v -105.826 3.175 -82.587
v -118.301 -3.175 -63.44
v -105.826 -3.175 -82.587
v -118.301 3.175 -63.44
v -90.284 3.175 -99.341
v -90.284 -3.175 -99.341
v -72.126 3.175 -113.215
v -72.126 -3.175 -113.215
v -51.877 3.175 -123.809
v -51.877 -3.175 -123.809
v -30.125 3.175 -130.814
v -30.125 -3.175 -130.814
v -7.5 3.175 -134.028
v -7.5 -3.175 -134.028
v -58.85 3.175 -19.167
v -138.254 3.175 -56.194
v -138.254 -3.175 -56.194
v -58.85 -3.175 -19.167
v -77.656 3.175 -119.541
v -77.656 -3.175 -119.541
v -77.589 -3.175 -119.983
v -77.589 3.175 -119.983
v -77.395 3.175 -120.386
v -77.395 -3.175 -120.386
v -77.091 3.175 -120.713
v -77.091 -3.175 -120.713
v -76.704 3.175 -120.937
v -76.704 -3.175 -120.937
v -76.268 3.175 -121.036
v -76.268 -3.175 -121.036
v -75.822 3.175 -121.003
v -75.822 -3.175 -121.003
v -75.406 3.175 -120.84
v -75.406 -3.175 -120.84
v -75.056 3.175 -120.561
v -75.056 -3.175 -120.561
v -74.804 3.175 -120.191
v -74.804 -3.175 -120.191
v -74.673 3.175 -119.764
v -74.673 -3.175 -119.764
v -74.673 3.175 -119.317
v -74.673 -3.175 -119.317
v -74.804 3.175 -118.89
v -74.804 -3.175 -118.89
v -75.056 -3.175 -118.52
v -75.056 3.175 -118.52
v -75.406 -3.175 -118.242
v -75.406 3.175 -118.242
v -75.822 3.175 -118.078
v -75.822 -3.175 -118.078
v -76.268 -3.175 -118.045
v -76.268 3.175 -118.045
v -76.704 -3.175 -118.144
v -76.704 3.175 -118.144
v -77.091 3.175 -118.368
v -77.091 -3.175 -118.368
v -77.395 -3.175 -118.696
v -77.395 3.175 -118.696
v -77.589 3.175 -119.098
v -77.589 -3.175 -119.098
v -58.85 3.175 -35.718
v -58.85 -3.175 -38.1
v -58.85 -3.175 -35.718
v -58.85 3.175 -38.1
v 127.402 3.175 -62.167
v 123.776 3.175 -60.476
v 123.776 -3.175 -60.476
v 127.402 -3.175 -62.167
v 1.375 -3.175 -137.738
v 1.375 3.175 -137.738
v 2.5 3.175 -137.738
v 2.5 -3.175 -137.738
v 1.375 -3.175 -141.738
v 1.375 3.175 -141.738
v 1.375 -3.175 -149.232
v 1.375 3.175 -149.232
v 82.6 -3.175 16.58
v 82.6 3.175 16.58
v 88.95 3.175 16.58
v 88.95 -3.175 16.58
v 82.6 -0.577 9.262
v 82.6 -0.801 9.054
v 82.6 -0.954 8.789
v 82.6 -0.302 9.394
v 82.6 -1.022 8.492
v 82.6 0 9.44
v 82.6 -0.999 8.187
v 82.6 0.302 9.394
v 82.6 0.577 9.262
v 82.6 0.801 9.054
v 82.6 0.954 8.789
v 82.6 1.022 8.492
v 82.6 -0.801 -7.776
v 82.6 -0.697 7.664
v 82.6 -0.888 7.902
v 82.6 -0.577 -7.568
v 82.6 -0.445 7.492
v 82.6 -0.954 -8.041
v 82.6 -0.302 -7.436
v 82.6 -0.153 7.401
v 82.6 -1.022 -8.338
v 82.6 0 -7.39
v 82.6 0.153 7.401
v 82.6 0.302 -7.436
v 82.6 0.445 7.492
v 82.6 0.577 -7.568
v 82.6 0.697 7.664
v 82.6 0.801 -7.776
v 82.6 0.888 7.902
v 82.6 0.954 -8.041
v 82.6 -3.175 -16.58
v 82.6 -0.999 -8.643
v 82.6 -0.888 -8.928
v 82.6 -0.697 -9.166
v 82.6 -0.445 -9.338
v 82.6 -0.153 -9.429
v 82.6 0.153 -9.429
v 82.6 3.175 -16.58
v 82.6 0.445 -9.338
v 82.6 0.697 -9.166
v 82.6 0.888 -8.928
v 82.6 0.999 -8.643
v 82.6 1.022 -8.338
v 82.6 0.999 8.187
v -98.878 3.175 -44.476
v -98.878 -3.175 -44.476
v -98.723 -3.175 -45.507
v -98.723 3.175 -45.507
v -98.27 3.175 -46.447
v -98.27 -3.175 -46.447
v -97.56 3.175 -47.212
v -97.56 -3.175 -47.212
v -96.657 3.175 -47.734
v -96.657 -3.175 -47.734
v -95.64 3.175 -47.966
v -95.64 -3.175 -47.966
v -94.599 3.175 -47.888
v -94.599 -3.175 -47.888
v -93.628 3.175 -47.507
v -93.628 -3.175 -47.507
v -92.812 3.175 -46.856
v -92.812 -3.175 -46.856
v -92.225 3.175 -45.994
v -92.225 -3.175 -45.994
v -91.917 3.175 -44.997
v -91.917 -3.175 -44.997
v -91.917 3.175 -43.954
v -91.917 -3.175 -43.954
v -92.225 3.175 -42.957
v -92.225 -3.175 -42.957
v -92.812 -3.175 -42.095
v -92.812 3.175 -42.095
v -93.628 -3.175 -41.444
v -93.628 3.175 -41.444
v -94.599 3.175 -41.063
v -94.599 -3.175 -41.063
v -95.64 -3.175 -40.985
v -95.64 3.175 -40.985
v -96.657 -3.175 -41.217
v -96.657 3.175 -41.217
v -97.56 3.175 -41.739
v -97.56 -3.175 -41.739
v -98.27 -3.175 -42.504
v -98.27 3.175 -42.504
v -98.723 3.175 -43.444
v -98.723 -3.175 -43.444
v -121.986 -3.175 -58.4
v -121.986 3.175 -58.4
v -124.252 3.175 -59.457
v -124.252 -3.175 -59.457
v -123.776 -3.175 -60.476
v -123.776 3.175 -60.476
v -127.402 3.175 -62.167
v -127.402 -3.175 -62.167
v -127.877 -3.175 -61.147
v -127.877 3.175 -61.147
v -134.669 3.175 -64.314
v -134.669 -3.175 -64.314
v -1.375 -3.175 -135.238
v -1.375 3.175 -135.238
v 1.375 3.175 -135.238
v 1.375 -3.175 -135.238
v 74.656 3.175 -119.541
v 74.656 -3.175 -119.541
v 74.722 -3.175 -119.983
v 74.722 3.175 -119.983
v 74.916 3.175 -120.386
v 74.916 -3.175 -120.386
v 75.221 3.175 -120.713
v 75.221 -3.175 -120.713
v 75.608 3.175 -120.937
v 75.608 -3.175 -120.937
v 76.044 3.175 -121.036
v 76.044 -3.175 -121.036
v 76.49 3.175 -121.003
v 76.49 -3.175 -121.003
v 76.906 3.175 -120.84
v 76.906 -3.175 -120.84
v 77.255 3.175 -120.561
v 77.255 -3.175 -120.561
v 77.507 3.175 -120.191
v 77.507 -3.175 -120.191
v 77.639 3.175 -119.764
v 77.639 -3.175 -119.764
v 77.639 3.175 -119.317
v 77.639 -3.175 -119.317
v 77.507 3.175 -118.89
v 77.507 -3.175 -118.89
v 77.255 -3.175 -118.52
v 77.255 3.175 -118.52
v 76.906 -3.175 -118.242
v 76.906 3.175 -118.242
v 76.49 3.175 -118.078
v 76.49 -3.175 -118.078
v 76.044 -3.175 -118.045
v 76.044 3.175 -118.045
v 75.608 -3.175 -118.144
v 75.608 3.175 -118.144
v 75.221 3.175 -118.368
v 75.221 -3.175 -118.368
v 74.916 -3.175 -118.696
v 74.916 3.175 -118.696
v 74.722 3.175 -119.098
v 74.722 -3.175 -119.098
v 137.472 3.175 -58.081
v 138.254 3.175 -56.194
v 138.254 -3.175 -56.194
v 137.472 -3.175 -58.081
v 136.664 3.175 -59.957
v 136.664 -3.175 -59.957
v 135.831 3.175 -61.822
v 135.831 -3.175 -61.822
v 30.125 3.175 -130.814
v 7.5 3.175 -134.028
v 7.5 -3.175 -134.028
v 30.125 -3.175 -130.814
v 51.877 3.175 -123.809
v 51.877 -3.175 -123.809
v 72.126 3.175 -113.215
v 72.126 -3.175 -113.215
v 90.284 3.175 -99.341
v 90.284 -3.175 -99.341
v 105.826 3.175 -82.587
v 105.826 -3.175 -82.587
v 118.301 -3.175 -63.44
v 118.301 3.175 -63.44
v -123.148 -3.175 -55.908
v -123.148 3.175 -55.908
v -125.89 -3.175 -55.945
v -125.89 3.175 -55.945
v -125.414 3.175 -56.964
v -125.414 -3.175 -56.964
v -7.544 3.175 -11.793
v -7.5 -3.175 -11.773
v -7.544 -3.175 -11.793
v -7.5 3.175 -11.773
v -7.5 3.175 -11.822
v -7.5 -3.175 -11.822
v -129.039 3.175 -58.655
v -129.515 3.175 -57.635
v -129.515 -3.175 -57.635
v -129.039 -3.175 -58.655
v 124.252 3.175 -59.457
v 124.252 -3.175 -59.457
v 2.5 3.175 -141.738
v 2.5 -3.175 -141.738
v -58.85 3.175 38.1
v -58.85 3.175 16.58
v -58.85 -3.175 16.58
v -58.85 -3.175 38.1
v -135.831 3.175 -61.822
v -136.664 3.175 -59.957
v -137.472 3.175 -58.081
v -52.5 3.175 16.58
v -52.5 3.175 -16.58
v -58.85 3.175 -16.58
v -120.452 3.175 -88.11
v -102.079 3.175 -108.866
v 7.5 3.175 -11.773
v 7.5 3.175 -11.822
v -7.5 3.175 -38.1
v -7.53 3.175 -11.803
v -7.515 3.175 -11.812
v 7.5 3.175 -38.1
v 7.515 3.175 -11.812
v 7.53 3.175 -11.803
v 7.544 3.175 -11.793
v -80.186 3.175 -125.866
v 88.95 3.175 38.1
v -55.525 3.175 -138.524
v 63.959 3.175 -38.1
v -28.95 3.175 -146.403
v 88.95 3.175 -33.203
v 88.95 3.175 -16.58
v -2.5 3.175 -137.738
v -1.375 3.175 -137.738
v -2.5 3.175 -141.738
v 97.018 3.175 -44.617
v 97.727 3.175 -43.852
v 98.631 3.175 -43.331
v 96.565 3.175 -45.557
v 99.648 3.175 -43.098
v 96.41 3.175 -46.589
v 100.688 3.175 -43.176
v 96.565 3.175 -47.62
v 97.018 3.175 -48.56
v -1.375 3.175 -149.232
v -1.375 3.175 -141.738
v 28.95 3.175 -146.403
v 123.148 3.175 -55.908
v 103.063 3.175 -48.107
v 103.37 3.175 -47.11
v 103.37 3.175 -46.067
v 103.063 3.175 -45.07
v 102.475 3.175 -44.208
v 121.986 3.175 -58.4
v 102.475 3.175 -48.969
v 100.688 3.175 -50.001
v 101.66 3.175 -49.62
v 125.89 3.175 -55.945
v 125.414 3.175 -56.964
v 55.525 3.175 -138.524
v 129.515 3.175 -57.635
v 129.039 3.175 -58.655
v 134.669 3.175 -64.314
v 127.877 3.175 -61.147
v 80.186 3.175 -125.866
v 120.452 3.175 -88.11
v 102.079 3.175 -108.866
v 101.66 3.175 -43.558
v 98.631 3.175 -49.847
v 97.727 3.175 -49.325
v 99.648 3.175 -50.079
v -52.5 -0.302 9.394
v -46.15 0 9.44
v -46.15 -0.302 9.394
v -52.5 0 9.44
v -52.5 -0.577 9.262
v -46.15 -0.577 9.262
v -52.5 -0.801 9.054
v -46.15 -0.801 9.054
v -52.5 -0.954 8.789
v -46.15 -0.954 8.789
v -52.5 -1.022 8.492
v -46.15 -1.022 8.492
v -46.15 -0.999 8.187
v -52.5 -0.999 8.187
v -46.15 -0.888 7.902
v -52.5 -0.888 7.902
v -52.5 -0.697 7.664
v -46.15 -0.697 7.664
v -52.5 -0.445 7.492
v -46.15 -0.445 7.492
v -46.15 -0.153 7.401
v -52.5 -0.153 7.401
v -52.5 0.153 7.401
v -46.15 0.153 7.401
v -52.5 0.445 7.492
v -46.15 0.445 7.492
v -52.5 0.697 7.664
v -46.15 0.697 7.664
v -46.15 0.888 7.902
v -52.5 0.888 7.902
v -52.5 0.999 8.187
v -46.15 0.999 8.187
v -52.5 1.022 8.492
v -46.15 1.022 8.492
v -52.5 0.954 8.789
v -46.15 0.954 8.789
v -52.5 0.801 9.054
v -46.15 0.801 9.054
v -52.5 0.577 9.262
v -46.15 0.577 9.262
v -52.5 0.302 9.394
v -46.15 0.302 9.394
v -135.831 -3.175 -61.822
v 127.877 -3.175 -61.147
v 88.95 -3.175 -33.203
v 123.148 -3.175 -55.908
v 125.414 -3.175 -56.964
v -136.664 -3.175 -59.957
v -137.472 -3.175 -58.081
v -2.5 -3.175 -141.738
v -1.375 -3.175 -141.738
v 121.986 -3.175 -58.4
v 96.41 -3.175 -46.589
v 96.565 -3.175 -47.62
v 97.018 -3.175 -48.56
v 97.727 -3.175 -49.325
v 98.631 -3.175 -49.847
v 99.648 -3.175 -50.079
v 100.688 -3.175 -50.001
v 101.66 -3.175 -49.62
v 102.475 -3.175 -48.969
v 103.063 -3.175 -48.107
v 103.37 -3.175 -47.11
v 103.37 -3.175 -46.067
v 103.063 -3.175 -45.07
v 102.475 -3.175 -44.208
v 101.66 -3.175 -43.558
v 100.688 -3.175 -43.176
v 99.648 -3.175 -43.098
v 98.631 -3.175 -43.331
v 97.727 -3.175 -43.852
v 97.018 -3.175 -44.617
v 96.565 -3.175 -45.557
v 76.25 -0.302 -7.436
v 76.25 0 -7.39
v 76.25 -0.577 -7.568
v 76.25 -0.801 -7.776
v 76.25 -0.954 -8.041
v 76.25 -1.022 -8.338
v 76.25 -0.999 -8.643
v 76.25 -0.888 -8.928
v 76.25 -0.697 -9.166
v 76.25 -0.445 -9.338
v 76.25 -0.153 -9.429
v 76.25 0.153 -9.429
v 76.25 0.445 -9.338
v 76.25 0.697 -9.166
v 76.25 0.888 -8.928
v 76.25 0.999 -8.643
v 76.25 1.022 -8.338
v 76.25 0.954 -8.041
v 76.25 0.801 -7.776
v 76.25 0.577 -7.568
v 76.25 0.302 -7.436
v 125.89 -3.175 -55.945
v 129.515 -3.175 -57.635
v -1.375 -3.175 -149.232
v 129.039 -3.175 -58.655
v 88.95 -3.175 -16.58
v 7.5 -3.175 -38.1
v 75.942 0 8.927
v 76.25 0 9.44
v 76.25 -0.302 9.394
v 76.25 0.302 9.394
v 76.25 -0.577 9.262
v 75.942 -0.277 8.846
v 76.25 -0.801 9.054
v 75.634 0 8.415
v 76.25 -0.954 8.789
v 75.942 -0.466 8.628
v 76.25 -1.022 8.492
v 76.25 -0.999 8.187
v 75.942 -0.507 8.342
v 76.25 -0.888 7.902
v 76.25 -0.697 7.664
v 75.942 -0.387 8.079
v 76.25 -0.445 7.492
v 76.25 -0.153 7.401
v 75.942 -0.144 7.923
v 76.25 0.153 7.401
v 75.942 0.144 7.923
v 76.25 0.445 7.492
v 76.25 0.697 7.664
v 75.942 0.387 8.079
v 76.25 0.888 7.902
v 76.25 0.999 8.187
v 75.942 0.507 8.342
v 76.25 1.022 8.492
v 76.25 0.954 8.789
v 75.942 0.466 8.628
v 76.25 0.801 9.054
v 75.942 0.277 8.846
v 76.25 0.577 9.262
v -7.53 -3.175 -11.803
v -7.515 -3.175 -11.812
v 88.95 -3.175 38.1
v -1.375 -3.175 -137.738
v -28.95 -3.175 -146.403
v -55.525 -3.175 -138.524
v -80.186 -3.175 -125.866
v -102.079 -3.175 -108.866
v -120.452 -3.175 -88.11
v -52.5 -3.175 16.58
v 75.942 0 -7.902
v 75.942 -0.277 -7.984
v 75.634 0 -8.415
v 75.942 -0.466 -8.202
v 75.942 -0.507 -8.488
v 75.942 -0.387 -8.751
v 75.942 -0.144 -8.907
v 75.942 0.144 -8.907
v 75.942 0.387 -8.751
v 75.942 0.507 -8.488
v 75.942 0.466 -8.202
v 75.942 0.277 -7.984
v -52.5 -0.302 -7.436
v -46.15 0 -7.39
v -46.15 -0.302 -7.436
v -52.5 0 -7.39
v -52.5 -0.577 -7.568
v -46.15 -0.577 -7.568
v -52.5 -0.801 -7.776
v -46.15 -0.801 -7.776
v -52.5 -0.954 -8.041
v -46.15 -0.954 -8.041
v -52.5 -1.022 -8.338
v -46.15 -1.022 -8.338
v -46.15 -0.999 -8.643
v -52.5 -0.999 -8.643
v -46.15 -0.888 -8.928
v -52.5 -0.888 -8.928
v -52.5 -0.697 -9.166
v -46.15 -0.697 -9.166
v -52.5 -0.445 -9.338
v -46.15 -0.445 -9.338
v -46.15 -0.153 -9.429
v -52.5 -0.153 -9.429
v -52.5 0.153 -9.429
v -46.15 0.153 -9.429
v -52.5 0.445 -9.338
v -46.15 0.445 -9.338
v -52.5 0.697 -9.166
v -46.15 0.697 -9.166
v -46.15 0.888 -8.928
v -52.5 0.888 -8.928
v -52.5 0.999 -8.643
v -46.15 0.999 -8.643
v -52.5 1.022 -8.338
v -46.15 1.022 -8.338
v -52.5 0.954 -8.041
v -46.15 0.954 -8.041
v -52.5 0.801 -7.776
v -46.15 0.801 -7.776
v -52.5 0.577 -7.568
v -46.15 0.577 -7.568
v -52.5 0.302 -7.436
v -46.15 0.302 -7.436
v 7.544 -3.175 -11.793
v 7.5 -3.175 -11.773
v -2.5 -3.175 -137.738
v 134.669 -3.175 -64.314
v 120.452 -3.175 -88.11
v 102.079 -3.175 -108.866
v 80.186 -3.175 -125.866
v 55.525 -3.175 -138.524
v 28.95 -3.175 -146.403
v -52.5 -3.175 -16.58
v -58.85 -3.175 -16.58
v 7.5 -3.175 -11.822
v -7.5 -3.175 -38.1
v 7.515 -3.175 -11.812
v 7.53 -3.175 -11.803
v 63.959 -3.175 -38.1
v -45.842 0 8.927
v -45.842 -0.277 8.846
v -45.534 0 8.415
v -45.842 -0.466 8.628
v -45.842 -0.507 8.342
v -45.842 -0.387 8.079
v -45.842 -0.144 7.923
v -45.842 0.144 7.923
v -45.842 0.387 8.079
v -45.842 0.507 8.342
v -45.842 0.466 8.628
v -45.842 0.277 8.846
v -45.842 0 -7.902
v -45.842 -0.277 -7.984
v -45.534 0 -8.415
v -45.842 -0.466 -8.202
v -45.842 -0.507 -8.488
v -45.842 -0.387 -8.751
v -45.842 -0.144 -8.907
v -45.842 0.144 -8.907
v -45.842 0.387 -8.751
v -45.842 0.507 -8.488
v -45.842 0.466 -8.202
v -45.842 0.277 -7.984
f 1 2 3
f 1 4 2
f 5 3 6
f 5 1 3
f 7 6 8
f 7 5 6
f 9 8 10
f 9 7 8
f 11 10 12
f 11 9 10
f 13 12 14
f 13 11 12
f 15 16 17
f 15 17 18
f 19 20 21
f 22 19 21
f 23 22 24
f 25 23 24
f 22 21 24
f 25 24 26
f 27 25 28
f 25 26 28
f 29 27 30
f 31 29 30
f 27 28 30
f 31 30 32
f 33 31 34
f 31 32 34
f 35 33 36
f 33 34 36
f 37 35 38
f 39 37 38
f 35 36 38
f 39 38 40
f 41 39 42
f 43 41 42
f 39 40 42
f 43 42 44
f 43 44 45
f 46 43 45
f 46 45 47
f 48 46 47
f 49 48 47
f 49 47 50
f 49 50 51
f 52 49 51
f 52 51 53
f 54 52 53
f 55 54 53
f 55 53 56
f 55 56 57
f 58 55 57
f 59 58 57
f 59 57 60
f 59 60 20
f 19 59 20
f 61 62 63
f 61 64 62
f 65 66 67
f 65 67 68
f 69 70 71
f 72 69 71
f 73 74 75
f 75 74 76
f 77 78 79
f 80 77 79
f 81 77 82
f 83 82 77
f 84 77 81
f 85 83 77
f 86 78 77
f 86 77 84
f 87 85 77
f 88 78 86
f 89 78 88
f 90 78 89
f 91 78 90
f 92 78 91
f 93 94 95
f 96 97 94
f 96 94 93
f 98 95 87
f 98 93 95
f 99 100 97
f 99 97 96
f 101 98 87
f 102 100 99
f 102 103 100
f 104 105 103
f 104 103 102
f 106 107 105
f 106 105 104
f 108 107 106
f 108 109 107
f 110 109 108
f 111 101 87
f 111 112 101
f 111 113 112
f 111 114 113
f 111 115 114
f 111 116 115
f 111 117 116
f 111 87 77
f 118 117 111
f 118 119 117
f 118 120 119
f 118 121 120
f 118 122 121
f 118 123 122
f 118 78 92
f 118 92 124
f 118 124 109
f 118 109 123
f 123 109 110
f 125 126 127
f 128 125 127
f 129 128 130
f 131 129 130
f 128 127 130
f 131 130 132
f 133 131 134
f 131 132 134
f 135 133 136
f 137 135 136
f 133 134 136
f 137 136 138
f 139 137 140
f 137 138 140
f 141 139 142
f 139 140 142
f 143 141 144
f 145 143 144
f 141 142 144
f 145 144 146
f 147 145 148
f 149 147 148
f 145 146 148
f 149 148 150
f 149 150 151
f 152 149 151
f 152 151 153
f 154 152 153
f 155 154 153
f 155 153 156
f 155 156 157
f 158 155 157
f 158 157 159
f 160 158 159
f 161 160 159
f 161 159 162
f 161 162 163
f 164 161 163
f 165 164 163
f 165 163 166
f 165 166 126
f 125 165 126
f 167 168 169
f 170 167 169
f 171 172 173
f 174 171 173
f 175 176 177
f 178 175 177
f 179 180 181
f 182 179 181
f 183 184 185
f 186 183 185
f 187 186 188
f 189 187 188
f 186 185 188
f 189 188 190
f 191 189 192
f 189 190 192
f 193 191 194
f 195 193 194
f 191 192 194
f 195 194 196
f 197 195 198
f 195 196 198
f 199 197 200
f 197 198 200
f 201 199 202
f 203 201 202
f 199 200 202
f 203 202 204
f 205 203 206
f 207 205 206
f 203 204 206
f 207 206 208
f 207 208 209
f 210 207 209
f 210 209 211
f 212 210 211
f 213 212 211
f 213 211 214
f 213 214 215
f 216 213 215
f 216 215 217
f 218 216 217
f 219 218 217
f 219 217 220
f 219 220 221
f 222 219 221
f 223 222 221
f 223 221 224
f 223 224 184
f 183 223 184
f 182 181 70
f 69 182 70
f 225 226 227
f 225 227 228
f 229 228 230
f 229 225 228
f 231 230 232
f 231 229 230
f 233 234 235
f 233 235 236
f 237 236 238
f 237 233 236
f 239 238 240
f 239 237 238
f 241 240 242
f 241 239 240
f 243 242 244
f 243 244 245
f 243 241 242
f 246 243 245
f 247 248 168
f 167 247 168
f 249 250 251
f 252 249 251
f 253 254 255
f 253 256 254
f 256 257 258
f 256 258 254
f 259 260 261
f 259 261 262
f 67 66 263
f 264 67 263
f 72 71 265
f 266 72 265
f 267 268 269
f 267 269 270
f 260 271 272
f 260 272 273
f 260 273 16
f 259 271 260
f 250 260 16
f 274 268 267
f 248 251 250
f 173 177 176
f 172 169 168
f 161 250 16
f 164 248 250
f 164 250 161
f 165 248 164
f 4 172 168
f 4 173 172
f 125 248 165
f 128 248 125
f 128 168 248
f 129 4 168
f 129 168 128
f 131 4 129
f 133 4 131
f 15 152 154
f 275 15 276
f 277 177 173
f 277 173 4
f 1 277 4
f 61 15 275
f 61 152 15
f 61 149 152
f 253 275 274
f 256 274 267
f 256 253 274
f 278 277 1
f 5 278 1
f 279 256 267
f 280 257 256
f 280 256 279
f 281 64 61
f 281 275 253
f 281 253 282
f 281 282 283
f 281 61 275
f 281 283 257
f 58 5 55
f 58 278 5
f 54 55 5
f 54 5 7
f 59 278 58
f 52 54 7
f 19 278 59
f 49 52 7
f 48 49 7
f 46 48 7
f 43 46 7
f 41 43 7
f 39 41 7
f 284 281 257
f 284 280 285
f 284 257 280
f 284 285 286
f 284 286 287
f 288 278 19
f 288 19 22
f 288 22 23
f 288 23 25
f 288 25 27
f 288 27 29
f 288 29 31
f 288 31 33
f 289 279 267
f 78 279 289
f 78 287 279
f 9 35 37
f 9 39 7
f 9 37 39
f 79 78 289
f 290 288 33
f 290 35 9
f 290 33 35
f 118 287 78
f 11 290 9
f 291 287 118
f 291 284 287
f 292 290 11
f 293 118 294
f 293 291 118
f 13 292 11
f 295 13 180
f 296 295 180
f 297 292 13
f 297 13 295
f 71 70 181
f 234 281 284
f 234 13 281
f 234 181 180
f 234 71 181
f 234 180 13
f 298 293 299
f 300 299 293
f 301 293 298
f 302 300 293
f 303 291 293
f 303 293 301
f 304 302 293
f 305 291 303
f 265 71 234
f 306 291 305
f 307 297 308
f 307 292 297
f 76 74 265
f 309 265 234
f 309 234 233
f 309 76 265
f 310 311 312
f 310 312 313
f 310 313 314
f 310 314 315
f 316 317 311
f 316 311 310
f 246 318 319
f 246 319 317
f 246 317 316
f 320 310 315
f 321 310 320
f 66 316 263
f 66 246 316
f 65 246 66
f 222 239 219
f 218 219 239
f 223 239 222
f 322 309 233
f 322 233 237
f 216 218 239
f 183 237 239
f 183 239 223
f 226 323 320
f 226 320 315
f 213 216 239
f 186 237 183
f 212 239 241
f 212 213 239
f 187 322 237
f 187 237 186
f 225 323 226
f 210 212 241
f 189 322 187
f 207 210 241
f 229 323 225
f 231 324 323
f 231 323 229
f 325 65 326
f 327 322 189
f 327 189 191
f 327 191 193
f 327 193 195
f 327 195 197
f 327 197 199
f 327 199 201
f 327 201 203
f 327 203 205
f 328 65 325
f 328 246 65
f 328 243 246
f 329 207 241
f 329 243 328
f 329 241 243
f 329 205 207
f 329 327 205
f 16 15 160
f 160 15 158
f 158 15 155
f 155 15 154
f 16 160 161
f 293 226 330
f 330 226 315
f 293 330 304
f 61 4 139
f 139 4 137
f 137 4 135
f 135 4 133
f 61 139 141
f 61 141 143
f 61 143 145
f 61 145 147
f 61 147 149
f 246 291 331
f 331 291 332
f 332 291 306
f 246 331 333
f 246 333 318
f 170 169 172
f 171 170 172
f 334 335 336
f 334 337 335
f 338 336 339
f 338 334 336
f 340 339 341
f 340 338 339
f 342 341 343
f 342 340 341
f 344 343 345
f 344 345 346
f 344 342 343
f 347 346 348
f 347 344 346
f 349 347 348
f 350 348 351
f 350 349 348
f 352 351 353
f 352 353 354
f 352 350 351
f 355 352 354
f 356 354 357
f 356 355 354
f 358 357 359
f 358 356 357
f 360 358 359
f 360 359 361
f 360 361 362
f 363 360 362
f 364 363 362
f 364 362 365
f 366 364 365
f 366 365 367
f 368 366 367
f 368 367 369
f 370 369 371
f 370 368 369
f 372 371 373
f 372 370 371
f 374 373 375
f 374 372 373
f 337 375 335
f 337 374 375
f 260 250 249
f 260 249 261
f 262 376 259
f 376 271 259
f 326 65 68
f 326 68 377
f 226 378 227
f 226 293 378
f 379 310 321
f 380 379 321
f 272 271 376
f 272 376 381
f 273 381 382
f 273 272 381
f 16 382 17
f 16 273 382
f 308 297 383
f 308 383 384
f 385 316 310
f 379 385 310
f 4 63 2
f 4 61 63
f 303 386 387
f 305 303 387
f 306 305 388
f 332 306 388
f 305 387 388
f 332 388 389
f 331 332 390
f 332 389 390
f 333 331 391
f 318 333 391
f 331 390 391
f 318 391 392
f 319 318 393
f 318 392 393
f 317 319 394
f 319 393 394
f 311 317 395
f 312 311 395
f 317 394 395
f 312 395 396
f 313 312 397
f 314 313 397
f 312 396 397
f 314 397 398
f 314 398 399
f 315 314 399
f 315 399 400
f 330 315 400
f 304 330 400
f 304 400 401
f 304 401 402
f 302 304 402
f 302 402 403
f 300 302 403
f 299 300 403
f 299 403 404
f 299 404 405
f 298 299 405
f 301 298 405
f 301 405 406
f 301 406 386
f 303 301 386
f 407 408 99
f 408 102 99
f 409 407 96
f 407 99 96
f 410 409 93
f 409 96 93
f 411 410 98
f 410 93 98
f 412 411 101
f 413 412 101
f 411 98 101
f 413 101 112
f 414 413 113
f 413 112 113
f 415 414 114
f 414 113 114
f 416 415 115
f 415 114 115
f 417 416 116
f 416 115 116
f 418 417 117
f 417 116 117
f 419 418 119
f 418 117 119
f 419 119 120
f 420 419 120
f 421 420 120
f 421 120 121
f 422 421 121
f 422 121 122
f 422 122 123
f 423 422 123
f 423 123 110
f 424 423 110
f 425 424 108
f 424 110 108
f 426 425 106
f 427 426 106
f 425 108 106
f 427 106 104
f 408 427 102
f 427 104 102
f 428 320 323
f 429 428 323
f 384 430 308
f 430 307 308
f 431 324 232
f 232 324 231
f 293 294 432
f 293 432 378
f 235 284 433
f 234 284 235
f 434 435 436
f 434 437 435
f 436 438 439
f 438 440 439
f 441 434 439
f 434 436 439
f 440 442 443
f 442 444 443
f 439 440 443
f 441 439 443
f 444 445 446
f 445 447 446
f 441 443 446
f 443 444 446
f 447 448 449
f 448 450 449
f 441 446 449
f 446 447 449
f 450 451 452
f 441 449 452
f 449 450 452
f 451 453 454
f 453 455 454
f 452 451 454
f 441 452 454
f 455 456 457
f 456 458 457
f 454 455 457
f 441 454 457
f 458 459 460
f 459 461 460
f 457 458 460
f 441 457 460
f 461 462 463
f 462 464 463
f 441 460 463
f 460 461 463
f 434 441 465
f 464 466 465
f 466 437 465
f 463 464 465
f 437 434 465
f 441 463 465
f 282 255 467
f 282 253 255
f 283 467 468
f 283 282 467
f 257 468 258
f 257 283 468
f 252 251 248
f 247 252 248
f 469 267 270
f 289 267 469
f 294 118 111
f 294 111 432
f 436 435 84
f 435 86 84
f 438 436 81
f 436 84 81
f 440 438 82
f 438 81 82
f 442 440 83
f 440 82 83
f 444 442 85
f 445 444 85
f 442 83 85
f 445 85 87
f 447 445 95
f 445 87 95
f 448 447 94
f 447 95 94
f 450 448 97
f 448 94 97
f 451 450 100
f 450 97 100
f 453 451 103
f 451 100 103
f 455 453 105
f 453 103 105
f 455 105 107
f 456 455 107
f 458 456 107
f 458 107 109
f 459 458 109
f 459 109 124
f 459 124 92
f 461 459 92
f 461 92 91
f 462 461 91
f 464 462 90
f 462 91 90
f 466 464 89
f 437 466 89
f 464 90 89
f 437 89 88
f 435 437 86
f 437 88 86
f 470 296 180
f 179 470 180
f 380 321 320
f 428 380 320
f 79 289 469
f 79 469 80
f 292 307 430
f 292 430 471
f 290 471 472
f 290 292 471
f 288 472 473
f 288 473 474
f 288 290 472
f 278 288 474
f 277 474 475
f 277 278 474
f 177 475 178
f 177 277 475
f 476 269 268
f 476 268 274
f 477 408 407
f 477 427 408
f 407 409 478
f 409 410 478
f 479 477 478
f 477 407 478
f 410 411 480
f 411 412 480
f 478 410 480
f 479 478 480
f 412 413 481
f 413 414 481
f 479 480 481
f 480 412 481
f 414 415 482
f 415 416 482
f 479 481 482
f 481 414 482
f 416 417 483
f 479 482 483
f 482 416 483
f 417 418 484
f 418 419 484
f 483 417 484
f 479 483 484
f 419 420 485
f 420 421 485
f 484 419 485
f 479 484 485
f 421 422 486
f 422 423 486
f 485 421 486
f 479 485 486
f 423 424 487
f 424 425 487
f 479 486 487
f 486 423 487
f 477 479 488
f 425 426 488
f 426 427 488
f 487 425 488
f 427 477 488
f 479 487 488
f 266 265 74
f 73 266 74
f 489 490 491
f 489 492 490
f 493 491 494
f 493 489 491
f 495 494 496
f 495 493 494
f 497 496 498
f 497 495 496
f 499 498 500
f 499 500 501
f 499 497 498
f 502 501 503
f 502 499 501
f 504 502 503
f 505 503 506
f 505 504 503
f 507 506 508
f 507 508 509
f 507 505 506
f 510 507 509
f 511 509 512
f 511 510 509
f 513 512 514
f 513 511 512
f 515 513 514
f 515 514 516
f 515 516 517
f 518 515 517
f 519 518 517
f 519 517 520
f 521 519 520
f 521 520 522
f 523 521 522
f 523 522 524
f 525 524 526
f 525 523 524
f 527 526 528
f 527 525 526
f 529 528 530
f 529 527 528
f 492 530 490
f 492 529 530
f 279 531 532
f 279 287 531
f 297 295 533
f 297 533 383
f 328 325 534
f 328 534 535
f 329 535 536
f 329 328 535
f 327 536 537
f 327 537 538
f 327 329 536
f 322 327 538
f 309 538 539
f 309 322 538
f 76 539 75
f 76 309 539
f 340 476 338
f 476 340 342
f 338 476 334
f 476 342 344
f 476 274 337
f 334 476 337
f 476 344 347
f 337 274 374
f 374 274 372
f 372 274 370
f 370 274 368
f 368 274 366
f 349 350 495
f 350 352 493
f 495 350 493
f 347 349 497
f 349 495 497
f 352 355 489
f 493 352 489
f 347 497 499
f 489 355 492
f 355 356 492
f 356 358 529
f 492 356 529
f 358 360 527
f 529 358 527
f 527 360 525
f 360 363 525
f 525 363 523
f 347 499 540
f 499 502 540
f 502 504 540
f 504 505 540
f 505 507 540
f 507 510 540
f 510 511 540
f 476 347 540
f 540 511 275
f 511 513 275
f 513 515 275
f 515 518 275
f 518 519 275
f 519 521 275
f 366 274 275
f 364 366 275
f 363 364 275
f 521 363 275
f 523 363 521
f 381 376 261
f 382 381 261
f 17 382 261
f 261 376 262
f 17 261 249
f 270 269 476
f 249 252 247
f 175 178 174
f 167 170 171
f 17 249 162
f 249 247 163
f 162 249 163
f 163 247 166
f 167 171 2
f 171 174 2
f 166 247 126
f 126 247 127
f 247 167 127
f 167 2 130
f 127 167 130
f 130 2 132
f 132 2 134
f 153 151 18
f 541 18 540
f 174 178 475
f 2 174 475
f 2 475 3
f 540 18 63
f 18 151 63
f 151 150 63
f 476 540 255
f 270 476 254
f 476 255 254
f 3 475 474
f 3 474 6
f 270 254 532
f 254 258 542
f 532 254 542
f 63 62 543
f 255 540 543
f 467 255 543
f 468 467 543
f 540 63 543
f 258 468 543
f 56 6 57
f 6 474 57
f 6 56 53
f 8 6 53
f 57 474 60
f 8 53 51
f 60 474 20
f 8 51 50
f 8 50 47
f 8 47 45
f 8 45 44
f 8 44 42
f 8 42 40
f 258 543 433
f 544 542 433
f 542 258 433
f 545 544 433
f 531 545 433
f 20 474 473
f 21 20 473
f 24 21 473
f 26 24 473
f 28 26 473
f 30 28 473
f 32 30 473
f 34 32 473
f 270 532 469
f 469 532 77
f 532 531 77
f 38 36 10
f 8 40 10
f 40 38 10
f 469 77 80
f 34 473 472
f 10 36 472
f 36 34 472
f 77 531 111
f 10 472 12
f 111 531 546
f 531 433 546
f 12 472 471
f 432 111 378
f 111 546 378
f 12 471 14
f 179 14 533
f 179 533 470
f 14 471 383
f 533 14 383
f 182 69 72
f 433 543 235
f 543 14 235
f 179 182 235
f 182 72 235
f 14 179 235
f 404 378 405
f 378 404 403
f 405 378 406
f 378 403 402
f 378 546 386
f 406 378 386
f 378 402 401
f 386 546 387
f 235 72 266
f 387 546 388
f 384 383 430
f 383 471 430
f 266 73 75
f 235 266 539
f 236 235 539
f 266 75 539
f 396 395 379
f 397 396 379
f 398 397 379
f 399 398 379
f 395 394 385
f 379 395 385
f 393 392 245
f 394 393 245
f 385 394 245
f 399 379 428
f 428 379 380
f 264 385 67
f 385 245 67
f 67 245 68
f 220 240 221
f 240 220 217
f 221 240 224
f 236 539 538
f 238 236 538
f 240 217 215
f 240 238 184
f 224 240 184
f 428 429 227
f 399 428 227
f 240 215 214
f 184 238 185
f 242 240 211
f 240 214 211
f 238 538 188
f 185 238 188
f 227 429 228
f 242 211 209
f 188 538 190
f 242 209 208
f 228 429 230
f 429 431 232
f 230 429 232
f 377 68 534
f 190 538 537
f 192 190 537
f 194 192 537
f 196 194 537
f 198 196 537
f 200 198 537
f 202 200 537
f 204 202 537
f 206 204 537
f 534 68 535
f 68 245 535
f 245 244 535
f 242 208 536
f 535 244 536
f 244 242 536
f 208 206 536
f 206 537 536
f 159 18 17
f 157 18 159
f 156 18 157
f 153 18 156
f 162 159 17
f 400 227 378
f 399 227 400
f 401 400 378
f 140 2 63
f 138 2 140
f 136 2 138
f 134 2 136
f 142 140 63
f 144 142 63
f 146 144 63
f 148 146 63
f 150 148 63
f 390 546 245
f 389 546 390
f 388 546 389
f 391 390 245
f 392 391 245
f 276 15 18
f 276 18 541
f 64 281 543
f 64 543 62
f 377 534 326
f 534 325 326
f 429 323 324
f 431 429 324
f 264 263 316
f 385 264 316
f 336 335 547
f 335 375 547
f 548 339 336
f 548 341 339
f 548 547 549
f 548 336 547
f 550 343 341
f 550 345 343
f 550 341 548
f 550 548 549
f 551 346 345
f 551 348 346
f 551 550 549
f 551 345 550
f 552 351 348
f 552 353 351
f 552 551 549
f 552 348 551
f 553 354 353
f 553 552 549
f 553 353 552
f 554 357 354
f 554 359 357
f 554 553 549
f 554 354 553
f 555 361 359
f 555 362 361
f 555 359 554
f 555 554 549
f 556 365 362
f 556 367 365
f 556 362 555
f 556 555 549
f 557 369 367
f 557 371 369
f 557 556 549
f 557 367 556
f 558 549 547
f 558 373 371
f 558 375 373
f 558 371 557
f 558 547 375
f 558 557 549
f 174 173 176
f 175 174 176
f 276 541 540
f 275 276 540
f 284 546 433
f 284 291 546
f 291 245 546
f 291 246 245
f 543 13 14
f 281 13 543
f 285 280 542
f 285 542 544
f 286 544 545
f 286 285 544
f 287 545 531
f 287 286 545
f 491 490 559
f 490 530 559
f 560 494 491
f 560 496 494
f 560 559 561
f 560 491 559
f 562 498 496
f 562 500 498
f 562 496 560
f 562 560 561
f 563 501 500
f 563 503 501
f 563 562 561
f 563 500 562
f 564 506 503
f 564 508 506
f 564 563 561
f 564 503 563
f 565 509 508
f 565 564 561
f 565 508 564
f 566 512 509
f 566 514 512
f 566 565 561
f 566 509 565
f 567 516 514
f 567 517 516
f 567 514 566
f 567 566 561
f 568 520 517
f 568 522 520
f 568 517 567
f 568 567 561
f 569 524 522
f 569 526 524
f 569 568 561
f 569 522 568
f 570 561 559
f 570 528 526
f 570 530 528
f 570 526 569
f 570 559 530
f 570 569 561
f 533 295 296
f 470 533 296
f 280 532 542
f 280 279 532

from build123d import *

# Parameters (mm, degrees)
BOSS_EXTRUDE1_DEPTH               = 3.175
SKETCH2_W                         = 2.75
SKETCH2_H                         = 2.5
SKETCH2_H_2                       = 4
SKETCH2_W_2                       = 1.125
SKETCH2_H_3                       = 7.5
CUT_EXTRUDE1_DEPTH                = 204.460831631
CIRPATTERN1_COUNT                 = 2
CIRPATTERN1_ANGLE                 = 65
CIRPATTERN1_THE_OTHER_WAY_COUNT   = 2
CIRPATTERN1_THE_OTHER_WAY_ANGLE   = 65
F_3_0_3_DIAMETER_HOLE1_D          = 3
SKETCH13_W                        = 6.35
SKETCH13_H                        = 33.16
CUT_EXTRUDE2_DEPTH                = 204.530492207
M2_5X0_45_TAPPED_HOLE1_AT_2_COUNT = 2
M2_5X0_45_TAPPED_HOLE1_AT_2_PITCH = 16.83
M6_CLEARANCE_HOLE1_D              = 7


with BuildPart() as part:
    # Sketch1 → Boss-Extrude1 (new, symmetric)
    with BuildSketch(Plane(origin=(0, 0, 0), x_dir=(1, 0, 0), z_dir=(0, 1, 0))):
        with BuildLine():
            Line((88.95, 33.202731801), (138.254290129, 56.193699868))
            ThreePointArc((138.254290129, 56.193699868), (0, 149.238), (-138.254290129, 56.193699868))
            Line((-138.254290129, 56.193699868), (-58.85, 19.16687129))
            Line((-58.85, 19.16687129), (-58.85, -38.1))
            Line((-58.85, -38.1), (88.95, -38.1))
            Line((88.95, -38.1), (88.95, 33.202731801))
        make_face()
        with BuildLine():
            Line((-7.5, 11.821590418), (-7.5, 11.772641828))
            Line((-7.5, 11.772641828), (-7.544362488, 11.793328396))
            ThreePointArc((-7.544362488, 11.793328396), (-7.522194517, 11.807480241), (-7.5, 11.821590418))
        make_face(mode=Mode.SUBTRACT)
        with BuildLine():
            ThreePointArc((7.5, 11.821590418), (7.522194517, 11.807480241), (7.544362488, 11.793328396))
            Line((7.544362488, 11.793328396), (7.5, 11.772641828))
            Line((7.5, 11.772641828), (7.5, 11.821590418))
        make_face(mode=Mode.SUBTRACT)
        with BuildLine():
            Line((-7.5, 134.028320306), (-7.5, 38.1))
            Line((-7.5, 38.1), (-58.85, 38.1))
            Line((-58.85, 38.1), (-58.85, 35.717540075))
            Line((-58.85, 35.717540075), (-118.301273414, 63.440124154))
            ThreePointArc((-118.301273414, 63.440124154), (-72.126024825, 113.215180903), (-7.5, 134.028320306))
        make_face(mode=Mode.SUBTRACT)
        with BuildLine():
            ThreePointArc((7.5, 134.028320306), (72.126024825, 113.215180903), (118.301273414, 63.440124154))
            Line((118.301273414, 63.440124154), (63.959201798, 38.1))
            Line((63.959201798, 38.1), (7.5, 38.1))
            Line((7.5, 38.1), (7.5, 134.028320306))
        make_face(mode=Mode.SUBTRACT)
    extrude(amount=BOSS_EXTRUDE1_DEPTH, both=True)

    # Sketch2 → Cut-Extrude1 (cut, symmetric)
    with BuildSketch(Plane(origin=(0, 0, 0), x_dir=(1, 0, 0), z_dir=(0, 1, 0))):
        with Locations((0, 136.488)):
            Rectangle(SKETCH2_W, SKETCH2_H)
        with Locations((0, 139.738)):
            Rectangle(SKETCH2_W, SKETCH2_H_2)
        with Locations((1.9375, 139.738)):
            Rectangle(SKETCH2_W_2, SKETCH2_H_2)
        with Locations((0, 145.488)):
            Rectangle(SKETCH2_W, SKETCH2_H_3)
        with Locations((-1.9375, 139.738)):
            Rectangle(SKETCH2_W_2, SKETCH2_H_2)
    cut_extrude1 = extrude(amount=CUT_EXTRUDE1_DEPTH, both=True, mode=Mode.SUBTRACT)

    # CirPattern1: Cut-Extrude1 ×2 about axis
    cirpattern1_axis = Axis((0, 0, 0), (0, 1, 0))
    for i in range(1, CIRPATTERN1_COUNT):
        add(cut_extrude1.rotate(cirpattern1_axis, i * CIRPATTERN1_ANGLE / (CIRPATTERN1_COUNT - 1)), mode=Mode.SUBTRACT)

    # CirPattern1 the other way: Cut-Extrude1 ×2 about axis
    cirpattern1_the_other_way_axis = Axis((0, 0, 0), (0, -1, 0))
    for i in range(1, CIRPATTERN1_THE_OTHER_WAY_COUNT):
        add(cut_extrude1.rotate(cirpattern1_the_other_way_axis, i * CIRPATTERN1_THE_OTHER_WAY_ANGLE / (CIRPATTERN1_THE_OTHER_WAY_COUNT - 1)), mode=Mode.SUBTRACT)

    # Ø3.0 (3) Diameter Hole1 (through all)
    with Locations(Plane(origin=(0, 3.175, 0), x_dir=(1, 0, 0), z_dir=(0, 1, 0))):
        with Locations((76.155771888, 119.540616747), (-76.155771888, 119.540616747)):
            Hole(F_3_0_3_DIAMETER_HOLE1_D / 2)

    # Sketch13 → Cut-Extrude2 (cut, through all)
    with BuildSketch(Plane(origin=(0, 3.175, 0), x_dir=(1, 0, 0), z_dir=(0, 1, 0))):
        with Locations((-55.675, 0)):
            Rectangle(SKETCH13_W, SKETCH13_H)
        with Locations((85.775, 0)):
            Rectangle(SKETCH13_W, SKETCH13_H)
    extrude(amount=-CUT_EXTRUDE2_DEPTH, mode=Mode.SUBTRACT)

    # Sketch15 → M2.5x0.45 Tapped Hole1 (revolve, cut)
    with BuildSketch(Plane(origin=(-52.5, 0, -8.415), x_dir=(0, 0, 1), z_dir=(0, 1, 0))):
        Polygon((0, 0), (0, 6.965882135), (1.025, 6.35), (1.025, 0), align=None)
    m2_5x0_45_tapped_hole1 = revolve(axis=Axis((-58.85, 0, -8.415), (1, 0, 0)), mode=Mode.SUBTRACT)

    # M2.5x0.45 Tapped Hole1 at 2: M2.5x0.45 Tapped Hole1 ×2
    with Locations(*[(0, 0, i * M2_5X0_45_TAPPED_HOLE1_AT_2_PITCH) for i in range(1, M2_5X0_45_TAPPED_HOLE1_AT_2_COUNT)]):
        add(m2_5x0_45_tapped_hole1, mode=Mode.SUBTRACT)

    # Mirror1: M2.5x0.45 Tapped Hole1 across plane
    add(m2_5x0_45_tapped_hole1.mirror(Plane.ZY.offset(-15.05)), mode=Mode.SUBTRACT)

    # Mirror1 copy 1 sketch → Mirror1 copy 1 (revolve, cut)
    with BuildSketch(Plane(origin=(82.6, 0, 8.415), x_dir=(0, 0, 1), z_dir=(0, 1, 0))):
        Polygon((0, 0), (0, -6.965882135), (1.025, -6.35), (1.025, 0), align=None)
    revolve(axis=Axis((88.95, 0, 8.415), (1, 0, 0)), mode=Mode.SUBTRACT)

    # M6 Clearance Hole1 (through all)
    with Locations(Plane(origin=(0, 3.175, 0), x_dir=(1, 0, 0), z_dir=(0, 1, 0))):
        with Locations((99.909557827, 46.588591938), (-95.378018892, 44.475500629)):
            Hole(M6_CLEARANCE_HOLE1_D / 2)


solid = part.part
